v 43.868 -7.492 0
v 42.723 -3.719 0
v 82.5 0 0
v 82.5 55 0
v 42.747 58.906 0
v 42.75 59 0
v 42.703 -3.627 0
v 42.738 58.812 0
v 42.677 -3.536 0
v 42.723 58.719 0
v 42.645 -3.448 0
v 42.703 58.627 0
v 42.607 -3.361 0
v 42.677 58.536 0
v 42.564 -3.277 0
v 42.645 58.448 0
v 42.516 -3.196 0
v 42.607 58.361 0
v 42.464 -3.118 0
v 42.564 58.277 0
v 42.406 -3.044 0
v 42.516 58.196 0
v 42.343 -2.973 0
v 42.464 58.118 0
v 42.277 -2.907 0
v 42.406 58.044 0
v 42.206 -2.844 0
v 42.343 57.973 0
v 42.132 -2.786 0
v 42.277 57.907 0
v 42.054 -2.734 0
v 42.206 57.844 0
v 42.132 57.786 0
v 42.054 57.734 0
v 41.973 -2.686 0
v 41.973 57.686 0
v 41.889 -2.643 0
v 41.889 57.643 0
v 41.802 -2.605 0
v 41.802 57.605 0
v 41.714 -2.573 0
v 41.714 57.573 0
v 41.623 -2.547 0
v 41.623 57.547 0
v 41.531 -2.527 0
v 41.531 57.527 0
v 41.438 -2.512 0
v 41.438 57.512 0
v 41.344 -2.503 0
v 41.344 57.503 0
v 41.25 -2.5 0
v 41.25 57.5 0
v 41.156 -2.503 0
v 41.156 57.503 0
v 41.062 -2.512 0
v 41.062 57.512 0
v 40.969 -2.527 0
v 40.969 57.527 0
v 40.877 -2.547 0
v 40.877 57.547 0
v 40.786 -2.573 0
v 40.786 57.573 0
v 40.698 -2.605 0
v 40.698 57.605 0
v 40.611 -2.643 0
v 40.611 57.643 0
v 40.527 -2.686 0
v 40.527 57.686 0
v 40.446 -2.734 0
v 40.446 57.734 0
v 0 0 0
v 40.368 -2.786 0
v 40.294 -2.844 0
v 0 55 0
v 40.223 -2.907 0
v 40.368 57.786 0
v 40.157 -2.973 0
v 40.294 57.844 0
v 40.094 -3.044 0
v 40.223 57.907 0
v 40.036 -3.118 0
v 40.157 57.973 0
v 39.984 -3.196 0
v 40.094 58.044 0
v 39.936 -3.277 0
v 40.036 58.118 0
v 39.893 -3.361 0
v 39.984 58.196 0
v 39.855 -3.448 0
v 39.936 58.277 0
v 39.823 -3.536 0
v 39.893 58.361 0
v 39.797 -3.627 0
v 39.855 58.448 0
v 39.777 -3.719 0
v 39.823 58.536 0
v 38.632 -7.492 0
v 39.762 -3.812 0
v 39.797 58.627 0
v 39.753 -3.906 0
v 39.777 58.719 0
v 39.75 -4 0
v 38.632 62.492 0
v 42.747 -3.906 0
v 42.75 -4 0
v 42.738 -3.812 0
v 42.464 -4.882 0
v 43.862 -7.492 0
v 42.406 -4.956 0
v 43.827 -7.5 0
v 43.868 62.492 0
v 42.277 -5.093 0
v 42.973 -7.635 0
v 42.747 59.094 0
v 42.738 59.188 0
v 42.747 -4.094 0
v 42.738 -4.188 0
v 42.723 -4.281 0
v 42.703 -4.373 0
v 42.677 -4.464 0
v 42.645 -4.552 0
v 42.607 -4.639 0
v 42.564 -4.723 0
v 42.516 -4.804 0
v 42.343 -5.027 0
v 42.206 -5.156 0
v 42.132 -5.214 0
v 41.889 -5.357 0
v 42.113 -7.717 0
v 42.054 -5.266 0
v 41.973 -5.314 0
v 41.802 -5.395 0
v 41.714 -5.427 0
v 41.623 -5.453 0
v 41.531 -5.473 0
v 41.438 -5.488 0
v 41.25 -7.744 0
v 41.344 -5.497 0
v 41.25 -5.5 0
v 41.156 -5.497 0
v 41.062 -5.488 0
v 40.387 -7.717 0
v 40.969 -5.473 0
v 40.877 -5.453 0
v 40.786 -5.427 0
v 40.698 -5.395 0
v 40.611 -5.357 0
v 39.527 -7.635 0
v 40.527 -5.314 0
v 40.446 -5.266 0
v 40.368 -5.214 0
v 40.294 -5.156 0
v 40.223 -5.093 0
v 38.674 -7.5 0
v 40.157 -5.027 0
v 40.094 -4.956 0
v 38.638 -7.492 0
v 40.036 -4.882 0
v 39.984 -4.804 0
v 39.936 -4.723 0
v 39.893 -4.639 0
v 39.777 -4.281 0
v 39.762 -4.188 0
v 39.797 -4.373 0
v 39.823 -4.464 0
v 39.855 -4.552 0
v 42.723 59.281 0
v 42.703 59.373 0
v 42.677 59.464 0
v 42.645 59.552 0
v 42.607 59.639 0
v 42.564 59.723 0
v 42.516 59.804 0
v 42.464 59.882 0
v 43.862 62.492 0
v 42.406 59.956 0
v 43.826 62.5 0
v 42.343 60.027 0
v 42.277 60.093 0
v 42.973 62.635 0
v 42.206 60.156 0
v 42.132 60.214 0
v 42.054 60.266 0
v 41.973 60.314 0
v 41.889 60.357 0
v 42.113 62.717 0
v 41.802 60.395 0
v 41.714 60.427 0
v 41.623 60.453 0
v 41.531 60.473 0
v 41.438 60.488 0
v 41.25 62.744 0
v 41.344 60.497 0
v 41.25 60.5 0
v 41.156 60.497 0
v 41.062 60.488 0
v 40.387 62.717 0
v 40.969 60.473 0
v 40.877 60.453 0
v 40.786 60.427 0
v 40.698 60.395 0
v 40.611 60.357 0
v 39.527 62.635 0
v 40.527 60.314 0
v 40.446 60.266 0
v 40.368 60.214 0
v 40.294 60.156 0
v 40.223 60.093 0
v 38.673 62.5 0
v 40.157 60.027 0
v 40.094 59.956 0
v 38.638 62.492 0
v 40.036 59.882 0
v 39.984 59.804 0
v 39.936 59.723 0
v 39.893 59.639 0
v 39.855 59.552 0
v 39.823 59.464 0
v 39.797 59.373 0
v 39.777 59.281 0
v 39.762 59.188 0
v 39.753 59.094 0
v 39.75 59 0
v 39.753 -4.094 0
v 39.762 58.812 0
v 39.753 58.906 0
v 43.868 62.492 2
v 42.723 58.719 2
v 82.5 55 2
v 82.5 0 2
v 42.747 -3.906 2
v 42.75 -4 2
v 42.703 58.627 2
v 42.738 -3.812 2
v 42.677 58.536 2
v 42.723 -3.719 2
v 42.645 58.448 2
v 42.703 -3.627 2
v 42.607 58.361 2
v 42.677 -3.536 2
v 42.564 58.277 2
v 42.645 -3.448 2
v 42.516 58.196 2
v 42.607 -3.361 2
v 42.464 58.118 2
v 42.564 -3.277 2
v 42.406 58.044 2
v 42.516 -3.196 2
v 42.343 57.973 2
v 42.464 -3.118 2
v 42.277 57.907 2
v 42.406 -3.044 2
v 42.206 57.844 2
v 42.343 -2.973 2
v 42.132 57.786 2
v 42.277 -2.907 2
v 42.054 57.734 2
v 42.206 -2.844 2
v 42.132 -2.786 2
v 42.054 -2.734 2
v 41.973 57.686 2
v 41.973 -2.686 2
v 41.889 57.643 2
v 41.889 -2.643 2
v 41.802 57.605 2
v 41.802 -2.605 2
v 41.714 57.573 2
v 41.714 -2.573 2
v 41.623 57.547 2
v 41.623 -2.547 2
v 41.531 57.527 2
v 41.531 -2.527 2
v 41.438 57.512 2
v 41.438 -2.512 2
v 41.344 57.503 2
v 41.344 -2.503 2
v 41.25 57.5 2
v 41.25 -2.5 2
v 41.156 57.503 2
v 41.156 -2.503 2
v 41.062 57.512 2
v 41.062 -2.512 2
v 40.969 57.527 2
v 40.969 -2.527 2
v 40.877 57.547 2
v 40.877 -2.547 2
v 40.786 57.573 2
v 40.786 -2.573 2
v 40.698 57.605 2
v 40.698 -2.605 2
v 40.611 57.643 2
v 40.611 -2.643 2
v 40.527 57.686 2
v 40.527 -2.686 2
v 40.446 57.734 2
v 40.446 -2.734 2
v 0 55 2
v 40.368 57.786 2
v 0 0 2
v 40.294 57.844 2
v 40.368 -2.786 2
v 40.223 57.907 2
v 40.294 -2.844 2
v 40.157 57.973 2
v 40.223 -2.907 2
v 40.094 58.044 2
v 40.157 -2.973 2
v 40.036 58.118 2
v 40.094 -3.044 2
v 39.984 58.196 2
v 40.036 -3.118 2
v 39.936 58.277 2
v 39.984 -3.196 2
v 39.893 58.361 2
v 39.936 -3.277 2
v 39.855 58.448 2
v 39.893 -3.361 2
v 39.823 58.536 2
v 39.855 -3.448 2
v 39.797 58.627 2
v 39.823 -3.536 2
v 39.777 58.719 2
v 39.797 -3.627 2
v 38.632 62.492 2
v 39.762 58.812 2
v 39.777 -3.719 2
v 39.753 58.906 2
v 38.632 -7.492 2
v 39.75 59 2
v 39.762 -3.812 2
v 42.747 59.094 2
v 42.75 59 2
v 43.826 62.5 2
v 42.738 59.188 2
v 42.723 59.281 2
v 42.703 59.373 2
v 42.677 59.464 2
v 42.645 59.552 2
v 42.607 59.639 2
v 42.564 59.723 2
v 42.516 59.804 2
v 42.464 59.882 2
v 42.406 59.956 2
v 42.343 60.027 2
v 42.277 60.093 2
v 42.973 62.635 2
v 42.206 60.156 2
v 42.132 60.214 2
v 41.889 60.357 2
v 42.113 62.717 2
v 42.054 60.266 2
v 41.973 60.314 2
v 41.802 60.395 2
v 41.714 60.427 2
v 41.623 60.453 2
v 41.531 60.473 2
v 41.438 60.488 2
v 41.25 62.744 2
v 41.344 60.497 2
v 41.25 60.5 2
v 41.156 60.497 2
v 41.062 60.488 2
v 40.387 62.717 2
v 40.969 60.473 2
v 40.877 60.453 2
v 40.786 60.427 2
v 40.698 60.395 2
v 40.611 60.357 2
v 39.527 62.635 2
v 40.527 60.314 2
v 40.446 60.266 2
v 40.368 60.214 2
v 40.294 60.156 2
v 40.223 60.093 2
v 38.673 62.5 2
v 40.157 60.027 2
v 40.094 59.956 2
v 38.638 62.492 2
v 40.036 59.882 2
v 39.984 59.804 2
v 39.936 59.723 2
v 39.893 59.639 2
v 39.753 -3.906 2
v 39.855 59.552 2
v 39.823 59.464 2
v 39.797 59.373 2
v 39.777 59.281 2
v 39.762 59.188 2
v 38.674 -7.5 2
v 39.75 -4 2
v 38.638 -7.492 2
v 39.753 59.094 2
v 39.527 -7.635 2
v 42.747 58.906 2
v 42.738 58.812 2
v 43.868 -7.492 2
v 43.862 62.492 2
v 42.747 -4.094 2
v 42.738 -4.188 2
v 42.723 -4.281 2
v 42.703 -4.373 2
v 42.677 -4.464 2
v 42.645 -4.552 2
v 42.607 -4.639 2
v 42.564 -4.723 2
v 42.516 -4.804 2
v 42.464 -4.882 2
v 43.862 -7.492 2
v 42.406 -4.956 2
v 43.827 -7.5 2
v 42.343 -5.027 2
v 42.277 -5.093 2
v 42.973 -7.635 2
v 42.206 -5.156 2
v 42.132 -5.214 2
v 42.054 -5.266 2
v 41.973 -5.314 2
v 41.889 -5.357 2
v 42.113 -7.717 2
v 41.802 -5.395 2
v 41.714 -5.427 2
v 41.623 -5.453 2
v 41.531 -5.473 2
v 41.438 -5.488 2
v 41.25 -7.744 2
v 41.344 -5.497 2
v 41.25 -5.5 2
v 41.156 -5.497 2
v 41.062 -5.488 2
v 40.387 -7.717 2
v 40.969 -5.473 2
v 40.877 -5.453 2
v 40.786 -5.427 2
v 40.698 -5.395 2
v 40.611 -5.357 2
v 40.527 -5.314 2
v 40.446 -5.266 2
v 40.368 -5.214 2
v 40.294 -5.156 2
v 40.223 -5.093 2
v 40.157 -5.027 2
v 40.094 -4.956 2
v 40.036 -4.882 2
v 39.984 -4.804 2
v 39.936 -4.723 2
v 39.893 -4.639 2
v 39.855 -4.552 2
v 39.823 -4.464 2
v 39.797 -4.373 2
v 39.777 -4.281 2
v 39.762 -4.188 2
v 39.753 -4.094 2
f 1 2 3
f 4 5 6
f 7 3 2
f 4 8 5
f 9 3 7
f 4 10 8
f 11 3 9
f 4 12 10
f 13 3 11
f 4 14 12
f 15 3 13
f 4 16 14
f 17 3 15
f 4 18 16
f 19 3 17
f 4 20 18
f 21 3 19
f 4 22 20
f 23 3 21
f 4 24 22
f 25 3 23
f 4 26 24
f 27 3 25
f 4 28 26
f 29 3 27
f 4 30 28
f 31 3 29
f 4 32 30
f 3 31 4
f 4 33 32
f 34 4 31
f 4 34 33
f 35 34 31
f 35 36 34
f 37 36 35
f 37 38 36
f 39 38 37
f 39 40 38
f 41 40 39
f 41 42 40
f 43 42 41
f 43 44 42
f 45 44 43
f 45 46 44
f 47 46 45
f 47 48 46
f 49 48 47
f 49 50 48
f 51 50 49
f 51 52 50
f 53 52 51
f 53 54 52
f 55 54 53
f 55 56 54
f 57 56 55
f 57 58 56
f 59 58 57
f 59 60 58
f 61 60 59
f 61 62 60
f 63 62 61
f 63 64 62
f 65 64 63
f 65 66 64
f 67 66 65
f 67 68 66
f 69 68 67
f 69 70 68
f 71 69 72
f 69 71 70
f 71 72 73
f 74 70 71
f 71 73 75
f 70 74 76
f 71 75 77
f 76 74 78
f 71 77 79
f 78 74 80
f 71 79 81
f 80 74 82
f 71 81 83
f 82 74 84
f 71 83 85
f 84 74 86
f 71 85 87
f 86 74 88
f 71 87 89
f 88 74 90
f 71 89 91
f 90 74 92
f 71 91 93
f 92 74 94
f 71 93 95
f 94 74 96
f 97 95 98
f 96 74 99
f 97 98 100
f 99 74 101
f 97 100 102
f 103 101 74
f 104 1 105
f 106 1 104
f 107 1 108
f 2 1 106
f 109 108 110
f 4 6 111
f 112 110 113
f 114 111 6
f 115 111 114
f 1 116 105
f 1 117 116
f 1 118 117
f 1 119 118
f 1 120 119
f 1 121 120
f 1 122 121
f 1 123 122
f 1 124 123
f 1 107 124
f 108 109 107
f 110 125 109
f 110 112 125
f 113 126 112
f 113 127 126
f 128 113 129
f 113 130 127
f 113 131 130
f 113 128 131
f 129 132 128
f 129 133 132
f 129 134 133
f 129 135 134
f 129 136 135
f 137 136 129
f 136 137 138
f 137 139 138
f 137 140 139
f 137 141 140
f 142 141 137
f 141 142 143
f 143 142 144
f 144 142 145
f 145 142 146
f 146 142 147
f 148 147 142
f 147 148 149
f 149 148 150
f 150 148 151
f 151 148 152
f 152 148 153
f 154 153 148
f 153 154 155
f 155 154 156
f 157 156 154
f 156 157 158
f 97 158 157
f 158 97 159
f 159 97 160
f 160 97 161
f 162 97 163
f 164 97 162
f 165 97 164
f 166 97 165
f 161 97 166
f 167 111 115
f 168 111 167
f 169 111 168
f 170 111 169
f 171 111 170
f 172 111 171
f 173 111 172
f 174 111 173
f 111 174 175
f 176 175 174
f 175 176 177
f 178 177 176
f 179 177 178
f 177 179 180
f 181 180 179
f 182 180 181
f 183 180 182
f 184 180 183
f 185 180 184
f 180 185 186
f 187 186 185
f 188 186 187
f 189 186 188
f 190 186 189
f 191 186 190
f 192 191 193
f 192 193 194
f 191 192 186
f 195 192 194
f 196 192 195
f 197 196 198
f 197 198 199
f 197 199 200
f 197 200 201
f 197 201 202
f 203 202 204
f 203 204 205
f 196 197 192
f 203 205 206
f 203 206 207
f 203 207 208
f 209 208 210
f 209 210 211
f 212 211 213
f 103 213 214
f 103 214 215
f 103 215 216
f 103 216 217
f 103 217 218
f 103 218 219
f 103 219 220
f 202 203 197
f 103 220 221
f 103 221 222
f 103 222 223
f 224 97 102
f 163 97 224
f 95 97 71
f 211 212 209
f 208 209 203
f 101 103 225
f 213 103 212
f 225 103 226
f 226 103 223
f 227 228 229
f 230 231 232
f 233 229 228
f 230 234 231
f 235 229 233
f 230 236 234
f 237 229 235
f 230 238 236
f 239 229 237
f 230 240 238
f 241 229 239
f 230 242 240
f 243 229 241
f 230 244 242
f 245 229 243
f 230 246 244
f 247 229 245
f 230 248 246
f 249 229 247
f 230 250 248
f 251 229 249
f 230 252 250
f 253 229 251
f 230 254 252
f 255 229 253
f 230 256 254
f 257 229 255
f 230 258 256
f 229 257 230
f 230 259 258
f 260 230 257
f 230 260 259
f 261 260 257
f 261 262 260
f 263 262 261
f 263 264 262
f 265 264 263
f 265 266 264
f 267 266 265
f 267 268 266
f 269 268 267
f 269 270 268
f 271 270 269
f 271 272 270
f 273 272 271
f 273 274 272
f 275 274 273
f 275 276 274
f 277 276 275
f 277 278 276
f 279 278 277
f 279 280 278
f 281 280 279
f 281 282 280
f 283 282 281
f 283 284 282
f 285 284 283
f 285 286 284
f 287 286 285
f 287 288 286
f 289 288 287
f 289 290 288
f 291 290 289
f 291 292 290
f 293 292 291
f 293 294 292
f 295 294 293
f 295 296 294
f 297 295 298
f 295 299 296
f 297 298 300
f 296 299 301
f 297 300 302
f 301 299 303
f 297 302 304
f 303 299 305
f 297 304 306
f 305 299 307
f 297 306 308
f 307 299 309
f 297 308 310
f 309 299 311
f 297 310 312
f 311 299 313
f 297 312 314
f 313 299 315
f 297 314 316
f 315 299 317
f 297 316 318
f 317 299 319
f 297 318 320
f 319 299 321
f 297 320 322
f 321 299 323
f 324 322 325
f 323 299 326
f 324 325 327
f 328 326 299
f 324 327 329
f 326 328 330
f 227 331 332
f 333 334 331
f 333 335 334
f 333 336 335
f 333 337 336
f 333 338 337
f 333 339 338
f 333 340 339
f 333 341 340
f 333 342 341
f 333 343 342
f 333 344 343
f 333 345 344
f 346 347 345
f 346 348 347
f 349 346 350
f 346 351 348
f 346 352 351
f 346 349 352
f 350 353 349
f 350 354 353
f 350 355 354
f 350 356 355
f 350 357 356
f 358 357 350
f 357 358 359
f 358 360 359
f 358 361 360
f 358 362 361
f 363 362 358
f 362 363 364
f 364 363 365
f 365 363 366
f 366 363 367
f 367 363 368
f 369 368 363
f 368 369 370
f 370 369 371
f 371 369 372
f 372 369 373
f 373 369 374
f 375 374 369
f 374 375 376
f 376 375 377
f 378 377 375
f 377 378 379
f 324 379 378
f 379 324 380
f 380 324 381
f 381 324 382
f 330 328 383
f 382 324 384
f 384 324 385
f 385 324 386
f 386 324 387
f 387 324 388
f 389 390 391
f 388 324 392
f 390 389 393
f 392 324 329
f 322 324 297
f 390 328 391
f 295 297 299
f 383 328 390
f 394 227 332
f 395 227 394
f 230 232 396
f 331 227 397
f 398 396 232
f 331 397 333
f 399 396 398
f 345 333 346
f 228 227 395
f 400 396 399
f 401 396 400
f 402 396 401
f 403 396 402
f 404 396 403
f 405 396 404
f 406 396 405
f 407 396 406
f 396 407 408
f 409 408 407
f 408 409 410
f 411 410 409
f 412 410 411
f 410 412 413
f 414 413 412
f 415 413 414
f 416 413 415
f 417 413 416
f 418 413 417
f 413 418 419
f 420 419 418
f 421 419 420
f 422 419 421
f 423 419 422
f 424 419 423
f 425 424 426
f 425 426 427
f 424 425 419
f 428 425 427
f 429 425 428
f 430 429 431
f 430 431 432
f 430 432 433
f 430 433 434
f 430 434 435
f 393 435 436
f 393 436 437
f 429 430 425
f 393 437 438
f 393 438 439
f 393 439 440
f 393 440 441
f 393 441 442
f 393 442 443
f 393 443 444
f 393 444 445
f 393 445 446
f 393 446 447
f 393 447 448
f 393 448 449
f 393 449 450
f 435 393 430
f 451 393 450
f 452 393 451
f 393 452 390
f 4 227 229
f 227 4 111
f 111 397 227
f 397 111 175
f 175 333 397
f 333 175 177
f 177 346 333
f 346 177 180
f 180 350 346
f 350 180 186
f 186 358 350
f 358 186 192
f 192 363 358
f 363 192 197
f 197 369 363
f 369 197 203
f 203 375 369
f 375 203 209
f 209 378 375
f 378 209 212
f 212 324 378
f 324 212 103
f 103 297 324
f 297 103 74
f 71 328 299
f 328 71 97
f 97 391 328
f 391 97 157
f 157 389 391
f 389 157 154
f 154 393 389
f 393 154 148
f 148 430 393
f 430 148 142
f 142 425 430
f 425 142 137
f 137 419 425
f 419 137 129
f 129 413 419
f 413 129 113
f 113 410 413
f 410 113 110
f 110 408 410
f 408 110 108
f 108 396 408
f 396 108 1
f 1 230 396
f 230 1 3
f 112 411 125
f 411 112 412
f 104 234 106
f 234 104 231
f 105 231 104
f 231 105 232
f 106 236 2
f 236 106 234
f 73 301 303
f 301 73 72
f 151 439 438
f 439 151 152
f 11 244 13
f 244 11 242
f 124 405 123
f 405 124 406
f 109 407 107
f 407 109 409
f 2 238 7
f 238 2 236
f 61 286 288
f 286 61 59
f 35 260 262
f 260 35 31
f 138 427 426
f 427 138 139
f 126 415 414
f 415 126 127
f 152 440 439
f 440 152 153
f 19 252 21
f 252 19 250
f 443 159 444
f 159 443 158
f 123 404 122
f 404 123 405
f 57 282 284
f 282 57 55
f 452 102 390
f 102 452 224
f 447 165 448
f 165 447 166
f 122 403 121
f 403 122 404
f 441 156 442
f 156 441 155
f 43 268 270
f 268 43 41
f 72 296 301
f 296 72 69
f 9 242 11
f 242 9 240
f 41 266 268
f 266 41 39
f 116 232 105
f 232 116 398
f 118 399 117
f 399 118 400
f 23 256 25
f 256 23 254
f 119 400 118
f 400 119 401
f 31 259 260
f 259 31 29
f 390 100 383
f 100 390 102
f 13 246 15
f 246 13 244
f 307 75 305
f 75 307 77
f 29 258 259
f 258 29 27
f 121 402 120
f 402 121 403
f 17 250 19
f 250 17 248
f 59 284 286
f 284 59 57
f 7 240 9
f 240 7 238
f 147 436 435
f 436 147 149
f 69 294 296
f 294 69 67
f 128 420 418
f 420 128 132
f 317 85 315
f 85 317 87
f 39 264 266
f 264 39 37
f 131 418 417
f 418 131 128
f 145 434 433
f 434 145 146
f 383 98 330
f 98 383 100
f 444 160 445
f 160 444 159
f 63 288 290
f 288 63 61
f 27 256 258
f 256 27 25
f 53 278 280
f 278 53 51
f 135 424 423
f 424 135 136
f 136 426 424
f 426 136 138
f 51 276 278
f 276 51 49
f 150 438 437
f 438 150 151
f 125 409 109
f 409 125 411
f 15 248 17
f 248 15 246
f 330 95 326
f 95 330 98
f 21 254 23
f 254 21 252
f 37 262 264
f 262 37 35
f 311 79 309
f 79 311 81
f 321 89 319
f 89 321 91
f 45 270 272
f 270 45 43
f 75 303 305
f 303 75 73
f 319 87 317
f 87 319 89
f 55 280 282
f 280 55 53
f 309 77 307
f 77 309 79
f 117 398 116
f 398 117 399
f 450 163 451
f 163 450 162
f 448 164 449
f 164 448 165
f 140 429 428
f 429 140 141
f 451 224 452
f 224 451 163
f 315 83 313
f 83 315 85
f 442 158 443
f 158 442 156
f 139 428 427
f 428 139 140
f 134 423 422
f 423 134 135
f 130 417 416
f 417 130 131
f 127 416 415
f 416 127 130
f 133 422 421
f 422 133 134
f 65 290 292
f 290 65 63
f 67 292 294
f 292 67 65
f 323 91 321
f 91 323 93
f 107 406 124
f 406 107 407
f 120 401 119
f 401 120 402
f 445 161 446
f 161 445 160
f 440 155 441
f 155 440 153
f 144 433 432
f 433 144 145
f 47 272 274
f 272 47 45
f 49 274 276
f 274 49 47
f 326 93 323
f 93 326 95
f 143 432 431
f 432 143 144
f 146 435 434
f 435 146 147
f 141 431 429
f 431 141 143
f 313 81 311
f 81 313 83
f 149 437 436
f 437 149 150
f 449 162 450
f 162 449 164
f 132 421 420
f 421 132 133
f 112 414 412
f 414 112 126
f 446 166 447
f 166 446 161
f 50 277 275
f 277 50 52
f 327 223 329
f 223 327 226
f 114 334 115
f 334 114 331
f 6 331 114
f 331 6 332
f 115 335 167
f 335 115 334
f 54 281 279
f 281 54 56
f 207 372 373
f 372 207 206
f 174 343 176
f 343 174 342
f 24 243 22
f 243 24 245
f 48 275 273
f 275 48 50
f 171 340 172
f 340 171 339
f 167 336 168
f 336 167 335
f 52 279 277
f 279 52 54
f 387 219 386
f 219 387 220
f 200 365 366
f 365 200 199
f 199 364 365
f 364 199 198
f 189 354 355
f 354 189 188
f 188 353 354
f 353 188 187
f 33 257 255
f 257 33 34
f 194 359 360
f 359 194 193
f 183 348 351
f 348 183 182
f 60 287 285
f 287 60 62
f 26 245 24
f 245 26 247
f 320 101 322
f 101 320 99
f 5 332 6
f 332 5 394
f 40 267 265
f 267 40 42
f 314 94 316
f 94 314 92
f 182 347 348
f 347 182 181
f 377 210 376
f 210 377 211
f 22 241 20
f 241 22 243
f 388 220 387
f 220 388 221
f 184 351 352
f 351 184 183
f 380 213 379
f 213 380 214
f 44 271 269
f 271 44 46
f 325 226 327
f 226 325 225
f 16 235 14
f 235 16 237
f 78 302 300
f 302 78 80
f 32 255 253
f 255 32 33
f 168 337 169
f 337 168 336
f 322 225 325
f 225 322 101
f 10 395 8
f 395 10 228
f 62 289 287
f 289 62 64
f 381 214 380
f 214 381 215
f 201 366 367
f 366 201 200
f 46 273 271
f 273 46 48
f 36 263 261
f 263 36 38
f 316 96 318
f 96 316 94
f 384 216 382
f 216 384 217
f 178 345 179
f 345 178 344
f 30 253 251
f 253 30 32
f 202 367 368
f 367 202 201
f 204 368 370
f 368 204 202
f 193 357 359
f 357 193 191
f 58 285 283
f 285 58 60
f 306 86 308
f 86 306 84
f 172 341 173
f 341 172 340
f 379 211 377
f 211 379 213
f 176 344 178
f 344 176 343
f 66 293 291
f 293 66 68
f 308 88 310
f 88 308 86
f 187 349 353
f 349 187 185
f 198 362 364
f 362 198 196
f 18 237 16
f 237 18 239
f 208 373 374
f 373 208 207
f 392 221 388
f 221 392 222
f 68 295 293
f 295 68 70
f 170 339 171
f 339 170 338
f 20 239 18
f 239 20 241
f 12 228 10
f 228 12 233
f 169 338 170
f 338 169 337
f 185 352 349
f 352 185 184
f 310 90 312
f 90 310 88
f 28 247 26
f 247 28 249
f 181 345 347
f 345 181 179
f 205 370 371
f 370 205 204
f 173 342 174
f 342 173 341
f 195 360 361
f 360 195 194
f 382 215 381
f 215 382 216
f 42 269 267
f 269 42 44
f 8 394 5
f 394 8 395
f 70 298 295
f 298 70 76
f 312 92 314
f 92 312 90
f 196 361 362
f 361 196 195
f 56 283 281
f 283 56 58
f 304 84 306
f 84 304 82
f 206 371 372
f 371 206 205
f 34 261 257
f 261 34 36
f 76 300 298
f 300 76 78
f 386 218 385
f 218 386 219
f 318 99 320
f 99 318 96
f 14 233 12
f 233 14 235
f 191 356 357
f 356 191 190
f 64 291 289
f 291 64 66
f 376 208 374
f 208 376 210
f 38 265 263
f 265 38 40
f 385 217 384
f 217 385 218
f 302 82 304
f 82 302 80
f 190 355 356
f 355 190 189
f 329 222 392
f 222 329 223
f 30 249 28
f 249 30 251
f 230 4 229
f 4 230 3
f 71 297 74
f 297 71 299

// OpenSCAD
// file: ../../../lib/geometry.scad
// sof
// ------------------------------------------------------------------
//
// Autor: Ivo Panáček, February 2021
// ivo.panacek@gmail.com
// Version: 0
//
// ------------------------------------------------------------------
//
// geometry
//
// ------------------------------------------------------------------


// ------------------------------------------------------------------
// pomocný objekt = obloukem useknutý pravidelný lichoběžník

module cylinderCutTriangle( width, height, delta) {
    x = width/2;
    y = height;
    z = sqrt(x*x+y*y);
    
    r = delta*x/y;
    h = z*r/x;
    u = y-h;
    a = r*x/z;


    union() {
        difference() {
            cut = 3*r;
            polygon(points=[[0,0],[x,y],[width,0]]);
            translate([x-cut/2,a+u,0])square(size=cut);
        }
        difference() {
            cut = 3*r;
            translate([x,u,0])circle(r=r);
            translate([x-cut/2,a+u-cut,0])square(size=cut);
        }
    }
}

// ------------------------------------------------------------------
// eof
// main file
// sof
// ------------------------------------------------------------------
//
// Autor: Ivo Panáček, February 2021
// ivo.panacek@gmail.com
// Version: 0
//
// ------------------------------------------------------------------
//
// držák breadboard
//
// ------------------------------------------------------------------

use <../../../lib/geometry.scad>;

// -----------------------------------------
// rozměry desky

boardZ = 2; // tloušťka

// na šířku
boardY = 55; // výška
boardX = 82.5; // šířka

// va výšku
// boardX = 55; // výška
// boardY = 82.5; // šířka

// -----------------------------------------
// držák desky

handleHoleDiameter = 3; // průměr otvoru pro šroubek
handleHoleDistance1 = 4; // vzdálenost středu otvoru od desky
handleHoleDistance2 = 4; // vzdálenost středu otvoru od okraje

// ---------------------------------------------------------
// závislé hodnoty

handleWidth = handleHoleDistance1+handleHoleDistance2;

// ------------------------------------------------------------------
dreh=$t*360;
$fn=100;

// ------------------------------------------------------------------
// main program

color([0,1,0])board();
color([1,0,0])handle();

// ------------------------------------------------------------------
// modules

// -----------------------------------

module handle() {
    difference() {
        handles();
        handleHoles();
    }
}

module handles() {
    translate([0,boardY,0])
    oneHandle();
    translate([boardX,0,0])
    rotate([0,0,180])
    oneHandle();
}

module oneHandle() {
    z = boardZ;
    linear_extrude(height=z)
    cylinderCutTriangle( boardX, handleWidth, handleWidth/3);
}

// -----------------------------------


module handleHoles() {
    y = boardY+2*handleHoleDistance1;
    translate([boardX/2,-handleHoleDistance1,0])
    union() {
        handleHole();
        translate([0,y,0])
        handleHole();
    }
}

module handleHole() {
    translate([0,0,-boardZ])
    cylinder( d=handleHoleDiameter,h=3*boardZ);
}

// -----------------------------------

module board() {
    cube([boardX,boardY,boardZ]);
}

// ------------------------------------------------------------------
// eof
